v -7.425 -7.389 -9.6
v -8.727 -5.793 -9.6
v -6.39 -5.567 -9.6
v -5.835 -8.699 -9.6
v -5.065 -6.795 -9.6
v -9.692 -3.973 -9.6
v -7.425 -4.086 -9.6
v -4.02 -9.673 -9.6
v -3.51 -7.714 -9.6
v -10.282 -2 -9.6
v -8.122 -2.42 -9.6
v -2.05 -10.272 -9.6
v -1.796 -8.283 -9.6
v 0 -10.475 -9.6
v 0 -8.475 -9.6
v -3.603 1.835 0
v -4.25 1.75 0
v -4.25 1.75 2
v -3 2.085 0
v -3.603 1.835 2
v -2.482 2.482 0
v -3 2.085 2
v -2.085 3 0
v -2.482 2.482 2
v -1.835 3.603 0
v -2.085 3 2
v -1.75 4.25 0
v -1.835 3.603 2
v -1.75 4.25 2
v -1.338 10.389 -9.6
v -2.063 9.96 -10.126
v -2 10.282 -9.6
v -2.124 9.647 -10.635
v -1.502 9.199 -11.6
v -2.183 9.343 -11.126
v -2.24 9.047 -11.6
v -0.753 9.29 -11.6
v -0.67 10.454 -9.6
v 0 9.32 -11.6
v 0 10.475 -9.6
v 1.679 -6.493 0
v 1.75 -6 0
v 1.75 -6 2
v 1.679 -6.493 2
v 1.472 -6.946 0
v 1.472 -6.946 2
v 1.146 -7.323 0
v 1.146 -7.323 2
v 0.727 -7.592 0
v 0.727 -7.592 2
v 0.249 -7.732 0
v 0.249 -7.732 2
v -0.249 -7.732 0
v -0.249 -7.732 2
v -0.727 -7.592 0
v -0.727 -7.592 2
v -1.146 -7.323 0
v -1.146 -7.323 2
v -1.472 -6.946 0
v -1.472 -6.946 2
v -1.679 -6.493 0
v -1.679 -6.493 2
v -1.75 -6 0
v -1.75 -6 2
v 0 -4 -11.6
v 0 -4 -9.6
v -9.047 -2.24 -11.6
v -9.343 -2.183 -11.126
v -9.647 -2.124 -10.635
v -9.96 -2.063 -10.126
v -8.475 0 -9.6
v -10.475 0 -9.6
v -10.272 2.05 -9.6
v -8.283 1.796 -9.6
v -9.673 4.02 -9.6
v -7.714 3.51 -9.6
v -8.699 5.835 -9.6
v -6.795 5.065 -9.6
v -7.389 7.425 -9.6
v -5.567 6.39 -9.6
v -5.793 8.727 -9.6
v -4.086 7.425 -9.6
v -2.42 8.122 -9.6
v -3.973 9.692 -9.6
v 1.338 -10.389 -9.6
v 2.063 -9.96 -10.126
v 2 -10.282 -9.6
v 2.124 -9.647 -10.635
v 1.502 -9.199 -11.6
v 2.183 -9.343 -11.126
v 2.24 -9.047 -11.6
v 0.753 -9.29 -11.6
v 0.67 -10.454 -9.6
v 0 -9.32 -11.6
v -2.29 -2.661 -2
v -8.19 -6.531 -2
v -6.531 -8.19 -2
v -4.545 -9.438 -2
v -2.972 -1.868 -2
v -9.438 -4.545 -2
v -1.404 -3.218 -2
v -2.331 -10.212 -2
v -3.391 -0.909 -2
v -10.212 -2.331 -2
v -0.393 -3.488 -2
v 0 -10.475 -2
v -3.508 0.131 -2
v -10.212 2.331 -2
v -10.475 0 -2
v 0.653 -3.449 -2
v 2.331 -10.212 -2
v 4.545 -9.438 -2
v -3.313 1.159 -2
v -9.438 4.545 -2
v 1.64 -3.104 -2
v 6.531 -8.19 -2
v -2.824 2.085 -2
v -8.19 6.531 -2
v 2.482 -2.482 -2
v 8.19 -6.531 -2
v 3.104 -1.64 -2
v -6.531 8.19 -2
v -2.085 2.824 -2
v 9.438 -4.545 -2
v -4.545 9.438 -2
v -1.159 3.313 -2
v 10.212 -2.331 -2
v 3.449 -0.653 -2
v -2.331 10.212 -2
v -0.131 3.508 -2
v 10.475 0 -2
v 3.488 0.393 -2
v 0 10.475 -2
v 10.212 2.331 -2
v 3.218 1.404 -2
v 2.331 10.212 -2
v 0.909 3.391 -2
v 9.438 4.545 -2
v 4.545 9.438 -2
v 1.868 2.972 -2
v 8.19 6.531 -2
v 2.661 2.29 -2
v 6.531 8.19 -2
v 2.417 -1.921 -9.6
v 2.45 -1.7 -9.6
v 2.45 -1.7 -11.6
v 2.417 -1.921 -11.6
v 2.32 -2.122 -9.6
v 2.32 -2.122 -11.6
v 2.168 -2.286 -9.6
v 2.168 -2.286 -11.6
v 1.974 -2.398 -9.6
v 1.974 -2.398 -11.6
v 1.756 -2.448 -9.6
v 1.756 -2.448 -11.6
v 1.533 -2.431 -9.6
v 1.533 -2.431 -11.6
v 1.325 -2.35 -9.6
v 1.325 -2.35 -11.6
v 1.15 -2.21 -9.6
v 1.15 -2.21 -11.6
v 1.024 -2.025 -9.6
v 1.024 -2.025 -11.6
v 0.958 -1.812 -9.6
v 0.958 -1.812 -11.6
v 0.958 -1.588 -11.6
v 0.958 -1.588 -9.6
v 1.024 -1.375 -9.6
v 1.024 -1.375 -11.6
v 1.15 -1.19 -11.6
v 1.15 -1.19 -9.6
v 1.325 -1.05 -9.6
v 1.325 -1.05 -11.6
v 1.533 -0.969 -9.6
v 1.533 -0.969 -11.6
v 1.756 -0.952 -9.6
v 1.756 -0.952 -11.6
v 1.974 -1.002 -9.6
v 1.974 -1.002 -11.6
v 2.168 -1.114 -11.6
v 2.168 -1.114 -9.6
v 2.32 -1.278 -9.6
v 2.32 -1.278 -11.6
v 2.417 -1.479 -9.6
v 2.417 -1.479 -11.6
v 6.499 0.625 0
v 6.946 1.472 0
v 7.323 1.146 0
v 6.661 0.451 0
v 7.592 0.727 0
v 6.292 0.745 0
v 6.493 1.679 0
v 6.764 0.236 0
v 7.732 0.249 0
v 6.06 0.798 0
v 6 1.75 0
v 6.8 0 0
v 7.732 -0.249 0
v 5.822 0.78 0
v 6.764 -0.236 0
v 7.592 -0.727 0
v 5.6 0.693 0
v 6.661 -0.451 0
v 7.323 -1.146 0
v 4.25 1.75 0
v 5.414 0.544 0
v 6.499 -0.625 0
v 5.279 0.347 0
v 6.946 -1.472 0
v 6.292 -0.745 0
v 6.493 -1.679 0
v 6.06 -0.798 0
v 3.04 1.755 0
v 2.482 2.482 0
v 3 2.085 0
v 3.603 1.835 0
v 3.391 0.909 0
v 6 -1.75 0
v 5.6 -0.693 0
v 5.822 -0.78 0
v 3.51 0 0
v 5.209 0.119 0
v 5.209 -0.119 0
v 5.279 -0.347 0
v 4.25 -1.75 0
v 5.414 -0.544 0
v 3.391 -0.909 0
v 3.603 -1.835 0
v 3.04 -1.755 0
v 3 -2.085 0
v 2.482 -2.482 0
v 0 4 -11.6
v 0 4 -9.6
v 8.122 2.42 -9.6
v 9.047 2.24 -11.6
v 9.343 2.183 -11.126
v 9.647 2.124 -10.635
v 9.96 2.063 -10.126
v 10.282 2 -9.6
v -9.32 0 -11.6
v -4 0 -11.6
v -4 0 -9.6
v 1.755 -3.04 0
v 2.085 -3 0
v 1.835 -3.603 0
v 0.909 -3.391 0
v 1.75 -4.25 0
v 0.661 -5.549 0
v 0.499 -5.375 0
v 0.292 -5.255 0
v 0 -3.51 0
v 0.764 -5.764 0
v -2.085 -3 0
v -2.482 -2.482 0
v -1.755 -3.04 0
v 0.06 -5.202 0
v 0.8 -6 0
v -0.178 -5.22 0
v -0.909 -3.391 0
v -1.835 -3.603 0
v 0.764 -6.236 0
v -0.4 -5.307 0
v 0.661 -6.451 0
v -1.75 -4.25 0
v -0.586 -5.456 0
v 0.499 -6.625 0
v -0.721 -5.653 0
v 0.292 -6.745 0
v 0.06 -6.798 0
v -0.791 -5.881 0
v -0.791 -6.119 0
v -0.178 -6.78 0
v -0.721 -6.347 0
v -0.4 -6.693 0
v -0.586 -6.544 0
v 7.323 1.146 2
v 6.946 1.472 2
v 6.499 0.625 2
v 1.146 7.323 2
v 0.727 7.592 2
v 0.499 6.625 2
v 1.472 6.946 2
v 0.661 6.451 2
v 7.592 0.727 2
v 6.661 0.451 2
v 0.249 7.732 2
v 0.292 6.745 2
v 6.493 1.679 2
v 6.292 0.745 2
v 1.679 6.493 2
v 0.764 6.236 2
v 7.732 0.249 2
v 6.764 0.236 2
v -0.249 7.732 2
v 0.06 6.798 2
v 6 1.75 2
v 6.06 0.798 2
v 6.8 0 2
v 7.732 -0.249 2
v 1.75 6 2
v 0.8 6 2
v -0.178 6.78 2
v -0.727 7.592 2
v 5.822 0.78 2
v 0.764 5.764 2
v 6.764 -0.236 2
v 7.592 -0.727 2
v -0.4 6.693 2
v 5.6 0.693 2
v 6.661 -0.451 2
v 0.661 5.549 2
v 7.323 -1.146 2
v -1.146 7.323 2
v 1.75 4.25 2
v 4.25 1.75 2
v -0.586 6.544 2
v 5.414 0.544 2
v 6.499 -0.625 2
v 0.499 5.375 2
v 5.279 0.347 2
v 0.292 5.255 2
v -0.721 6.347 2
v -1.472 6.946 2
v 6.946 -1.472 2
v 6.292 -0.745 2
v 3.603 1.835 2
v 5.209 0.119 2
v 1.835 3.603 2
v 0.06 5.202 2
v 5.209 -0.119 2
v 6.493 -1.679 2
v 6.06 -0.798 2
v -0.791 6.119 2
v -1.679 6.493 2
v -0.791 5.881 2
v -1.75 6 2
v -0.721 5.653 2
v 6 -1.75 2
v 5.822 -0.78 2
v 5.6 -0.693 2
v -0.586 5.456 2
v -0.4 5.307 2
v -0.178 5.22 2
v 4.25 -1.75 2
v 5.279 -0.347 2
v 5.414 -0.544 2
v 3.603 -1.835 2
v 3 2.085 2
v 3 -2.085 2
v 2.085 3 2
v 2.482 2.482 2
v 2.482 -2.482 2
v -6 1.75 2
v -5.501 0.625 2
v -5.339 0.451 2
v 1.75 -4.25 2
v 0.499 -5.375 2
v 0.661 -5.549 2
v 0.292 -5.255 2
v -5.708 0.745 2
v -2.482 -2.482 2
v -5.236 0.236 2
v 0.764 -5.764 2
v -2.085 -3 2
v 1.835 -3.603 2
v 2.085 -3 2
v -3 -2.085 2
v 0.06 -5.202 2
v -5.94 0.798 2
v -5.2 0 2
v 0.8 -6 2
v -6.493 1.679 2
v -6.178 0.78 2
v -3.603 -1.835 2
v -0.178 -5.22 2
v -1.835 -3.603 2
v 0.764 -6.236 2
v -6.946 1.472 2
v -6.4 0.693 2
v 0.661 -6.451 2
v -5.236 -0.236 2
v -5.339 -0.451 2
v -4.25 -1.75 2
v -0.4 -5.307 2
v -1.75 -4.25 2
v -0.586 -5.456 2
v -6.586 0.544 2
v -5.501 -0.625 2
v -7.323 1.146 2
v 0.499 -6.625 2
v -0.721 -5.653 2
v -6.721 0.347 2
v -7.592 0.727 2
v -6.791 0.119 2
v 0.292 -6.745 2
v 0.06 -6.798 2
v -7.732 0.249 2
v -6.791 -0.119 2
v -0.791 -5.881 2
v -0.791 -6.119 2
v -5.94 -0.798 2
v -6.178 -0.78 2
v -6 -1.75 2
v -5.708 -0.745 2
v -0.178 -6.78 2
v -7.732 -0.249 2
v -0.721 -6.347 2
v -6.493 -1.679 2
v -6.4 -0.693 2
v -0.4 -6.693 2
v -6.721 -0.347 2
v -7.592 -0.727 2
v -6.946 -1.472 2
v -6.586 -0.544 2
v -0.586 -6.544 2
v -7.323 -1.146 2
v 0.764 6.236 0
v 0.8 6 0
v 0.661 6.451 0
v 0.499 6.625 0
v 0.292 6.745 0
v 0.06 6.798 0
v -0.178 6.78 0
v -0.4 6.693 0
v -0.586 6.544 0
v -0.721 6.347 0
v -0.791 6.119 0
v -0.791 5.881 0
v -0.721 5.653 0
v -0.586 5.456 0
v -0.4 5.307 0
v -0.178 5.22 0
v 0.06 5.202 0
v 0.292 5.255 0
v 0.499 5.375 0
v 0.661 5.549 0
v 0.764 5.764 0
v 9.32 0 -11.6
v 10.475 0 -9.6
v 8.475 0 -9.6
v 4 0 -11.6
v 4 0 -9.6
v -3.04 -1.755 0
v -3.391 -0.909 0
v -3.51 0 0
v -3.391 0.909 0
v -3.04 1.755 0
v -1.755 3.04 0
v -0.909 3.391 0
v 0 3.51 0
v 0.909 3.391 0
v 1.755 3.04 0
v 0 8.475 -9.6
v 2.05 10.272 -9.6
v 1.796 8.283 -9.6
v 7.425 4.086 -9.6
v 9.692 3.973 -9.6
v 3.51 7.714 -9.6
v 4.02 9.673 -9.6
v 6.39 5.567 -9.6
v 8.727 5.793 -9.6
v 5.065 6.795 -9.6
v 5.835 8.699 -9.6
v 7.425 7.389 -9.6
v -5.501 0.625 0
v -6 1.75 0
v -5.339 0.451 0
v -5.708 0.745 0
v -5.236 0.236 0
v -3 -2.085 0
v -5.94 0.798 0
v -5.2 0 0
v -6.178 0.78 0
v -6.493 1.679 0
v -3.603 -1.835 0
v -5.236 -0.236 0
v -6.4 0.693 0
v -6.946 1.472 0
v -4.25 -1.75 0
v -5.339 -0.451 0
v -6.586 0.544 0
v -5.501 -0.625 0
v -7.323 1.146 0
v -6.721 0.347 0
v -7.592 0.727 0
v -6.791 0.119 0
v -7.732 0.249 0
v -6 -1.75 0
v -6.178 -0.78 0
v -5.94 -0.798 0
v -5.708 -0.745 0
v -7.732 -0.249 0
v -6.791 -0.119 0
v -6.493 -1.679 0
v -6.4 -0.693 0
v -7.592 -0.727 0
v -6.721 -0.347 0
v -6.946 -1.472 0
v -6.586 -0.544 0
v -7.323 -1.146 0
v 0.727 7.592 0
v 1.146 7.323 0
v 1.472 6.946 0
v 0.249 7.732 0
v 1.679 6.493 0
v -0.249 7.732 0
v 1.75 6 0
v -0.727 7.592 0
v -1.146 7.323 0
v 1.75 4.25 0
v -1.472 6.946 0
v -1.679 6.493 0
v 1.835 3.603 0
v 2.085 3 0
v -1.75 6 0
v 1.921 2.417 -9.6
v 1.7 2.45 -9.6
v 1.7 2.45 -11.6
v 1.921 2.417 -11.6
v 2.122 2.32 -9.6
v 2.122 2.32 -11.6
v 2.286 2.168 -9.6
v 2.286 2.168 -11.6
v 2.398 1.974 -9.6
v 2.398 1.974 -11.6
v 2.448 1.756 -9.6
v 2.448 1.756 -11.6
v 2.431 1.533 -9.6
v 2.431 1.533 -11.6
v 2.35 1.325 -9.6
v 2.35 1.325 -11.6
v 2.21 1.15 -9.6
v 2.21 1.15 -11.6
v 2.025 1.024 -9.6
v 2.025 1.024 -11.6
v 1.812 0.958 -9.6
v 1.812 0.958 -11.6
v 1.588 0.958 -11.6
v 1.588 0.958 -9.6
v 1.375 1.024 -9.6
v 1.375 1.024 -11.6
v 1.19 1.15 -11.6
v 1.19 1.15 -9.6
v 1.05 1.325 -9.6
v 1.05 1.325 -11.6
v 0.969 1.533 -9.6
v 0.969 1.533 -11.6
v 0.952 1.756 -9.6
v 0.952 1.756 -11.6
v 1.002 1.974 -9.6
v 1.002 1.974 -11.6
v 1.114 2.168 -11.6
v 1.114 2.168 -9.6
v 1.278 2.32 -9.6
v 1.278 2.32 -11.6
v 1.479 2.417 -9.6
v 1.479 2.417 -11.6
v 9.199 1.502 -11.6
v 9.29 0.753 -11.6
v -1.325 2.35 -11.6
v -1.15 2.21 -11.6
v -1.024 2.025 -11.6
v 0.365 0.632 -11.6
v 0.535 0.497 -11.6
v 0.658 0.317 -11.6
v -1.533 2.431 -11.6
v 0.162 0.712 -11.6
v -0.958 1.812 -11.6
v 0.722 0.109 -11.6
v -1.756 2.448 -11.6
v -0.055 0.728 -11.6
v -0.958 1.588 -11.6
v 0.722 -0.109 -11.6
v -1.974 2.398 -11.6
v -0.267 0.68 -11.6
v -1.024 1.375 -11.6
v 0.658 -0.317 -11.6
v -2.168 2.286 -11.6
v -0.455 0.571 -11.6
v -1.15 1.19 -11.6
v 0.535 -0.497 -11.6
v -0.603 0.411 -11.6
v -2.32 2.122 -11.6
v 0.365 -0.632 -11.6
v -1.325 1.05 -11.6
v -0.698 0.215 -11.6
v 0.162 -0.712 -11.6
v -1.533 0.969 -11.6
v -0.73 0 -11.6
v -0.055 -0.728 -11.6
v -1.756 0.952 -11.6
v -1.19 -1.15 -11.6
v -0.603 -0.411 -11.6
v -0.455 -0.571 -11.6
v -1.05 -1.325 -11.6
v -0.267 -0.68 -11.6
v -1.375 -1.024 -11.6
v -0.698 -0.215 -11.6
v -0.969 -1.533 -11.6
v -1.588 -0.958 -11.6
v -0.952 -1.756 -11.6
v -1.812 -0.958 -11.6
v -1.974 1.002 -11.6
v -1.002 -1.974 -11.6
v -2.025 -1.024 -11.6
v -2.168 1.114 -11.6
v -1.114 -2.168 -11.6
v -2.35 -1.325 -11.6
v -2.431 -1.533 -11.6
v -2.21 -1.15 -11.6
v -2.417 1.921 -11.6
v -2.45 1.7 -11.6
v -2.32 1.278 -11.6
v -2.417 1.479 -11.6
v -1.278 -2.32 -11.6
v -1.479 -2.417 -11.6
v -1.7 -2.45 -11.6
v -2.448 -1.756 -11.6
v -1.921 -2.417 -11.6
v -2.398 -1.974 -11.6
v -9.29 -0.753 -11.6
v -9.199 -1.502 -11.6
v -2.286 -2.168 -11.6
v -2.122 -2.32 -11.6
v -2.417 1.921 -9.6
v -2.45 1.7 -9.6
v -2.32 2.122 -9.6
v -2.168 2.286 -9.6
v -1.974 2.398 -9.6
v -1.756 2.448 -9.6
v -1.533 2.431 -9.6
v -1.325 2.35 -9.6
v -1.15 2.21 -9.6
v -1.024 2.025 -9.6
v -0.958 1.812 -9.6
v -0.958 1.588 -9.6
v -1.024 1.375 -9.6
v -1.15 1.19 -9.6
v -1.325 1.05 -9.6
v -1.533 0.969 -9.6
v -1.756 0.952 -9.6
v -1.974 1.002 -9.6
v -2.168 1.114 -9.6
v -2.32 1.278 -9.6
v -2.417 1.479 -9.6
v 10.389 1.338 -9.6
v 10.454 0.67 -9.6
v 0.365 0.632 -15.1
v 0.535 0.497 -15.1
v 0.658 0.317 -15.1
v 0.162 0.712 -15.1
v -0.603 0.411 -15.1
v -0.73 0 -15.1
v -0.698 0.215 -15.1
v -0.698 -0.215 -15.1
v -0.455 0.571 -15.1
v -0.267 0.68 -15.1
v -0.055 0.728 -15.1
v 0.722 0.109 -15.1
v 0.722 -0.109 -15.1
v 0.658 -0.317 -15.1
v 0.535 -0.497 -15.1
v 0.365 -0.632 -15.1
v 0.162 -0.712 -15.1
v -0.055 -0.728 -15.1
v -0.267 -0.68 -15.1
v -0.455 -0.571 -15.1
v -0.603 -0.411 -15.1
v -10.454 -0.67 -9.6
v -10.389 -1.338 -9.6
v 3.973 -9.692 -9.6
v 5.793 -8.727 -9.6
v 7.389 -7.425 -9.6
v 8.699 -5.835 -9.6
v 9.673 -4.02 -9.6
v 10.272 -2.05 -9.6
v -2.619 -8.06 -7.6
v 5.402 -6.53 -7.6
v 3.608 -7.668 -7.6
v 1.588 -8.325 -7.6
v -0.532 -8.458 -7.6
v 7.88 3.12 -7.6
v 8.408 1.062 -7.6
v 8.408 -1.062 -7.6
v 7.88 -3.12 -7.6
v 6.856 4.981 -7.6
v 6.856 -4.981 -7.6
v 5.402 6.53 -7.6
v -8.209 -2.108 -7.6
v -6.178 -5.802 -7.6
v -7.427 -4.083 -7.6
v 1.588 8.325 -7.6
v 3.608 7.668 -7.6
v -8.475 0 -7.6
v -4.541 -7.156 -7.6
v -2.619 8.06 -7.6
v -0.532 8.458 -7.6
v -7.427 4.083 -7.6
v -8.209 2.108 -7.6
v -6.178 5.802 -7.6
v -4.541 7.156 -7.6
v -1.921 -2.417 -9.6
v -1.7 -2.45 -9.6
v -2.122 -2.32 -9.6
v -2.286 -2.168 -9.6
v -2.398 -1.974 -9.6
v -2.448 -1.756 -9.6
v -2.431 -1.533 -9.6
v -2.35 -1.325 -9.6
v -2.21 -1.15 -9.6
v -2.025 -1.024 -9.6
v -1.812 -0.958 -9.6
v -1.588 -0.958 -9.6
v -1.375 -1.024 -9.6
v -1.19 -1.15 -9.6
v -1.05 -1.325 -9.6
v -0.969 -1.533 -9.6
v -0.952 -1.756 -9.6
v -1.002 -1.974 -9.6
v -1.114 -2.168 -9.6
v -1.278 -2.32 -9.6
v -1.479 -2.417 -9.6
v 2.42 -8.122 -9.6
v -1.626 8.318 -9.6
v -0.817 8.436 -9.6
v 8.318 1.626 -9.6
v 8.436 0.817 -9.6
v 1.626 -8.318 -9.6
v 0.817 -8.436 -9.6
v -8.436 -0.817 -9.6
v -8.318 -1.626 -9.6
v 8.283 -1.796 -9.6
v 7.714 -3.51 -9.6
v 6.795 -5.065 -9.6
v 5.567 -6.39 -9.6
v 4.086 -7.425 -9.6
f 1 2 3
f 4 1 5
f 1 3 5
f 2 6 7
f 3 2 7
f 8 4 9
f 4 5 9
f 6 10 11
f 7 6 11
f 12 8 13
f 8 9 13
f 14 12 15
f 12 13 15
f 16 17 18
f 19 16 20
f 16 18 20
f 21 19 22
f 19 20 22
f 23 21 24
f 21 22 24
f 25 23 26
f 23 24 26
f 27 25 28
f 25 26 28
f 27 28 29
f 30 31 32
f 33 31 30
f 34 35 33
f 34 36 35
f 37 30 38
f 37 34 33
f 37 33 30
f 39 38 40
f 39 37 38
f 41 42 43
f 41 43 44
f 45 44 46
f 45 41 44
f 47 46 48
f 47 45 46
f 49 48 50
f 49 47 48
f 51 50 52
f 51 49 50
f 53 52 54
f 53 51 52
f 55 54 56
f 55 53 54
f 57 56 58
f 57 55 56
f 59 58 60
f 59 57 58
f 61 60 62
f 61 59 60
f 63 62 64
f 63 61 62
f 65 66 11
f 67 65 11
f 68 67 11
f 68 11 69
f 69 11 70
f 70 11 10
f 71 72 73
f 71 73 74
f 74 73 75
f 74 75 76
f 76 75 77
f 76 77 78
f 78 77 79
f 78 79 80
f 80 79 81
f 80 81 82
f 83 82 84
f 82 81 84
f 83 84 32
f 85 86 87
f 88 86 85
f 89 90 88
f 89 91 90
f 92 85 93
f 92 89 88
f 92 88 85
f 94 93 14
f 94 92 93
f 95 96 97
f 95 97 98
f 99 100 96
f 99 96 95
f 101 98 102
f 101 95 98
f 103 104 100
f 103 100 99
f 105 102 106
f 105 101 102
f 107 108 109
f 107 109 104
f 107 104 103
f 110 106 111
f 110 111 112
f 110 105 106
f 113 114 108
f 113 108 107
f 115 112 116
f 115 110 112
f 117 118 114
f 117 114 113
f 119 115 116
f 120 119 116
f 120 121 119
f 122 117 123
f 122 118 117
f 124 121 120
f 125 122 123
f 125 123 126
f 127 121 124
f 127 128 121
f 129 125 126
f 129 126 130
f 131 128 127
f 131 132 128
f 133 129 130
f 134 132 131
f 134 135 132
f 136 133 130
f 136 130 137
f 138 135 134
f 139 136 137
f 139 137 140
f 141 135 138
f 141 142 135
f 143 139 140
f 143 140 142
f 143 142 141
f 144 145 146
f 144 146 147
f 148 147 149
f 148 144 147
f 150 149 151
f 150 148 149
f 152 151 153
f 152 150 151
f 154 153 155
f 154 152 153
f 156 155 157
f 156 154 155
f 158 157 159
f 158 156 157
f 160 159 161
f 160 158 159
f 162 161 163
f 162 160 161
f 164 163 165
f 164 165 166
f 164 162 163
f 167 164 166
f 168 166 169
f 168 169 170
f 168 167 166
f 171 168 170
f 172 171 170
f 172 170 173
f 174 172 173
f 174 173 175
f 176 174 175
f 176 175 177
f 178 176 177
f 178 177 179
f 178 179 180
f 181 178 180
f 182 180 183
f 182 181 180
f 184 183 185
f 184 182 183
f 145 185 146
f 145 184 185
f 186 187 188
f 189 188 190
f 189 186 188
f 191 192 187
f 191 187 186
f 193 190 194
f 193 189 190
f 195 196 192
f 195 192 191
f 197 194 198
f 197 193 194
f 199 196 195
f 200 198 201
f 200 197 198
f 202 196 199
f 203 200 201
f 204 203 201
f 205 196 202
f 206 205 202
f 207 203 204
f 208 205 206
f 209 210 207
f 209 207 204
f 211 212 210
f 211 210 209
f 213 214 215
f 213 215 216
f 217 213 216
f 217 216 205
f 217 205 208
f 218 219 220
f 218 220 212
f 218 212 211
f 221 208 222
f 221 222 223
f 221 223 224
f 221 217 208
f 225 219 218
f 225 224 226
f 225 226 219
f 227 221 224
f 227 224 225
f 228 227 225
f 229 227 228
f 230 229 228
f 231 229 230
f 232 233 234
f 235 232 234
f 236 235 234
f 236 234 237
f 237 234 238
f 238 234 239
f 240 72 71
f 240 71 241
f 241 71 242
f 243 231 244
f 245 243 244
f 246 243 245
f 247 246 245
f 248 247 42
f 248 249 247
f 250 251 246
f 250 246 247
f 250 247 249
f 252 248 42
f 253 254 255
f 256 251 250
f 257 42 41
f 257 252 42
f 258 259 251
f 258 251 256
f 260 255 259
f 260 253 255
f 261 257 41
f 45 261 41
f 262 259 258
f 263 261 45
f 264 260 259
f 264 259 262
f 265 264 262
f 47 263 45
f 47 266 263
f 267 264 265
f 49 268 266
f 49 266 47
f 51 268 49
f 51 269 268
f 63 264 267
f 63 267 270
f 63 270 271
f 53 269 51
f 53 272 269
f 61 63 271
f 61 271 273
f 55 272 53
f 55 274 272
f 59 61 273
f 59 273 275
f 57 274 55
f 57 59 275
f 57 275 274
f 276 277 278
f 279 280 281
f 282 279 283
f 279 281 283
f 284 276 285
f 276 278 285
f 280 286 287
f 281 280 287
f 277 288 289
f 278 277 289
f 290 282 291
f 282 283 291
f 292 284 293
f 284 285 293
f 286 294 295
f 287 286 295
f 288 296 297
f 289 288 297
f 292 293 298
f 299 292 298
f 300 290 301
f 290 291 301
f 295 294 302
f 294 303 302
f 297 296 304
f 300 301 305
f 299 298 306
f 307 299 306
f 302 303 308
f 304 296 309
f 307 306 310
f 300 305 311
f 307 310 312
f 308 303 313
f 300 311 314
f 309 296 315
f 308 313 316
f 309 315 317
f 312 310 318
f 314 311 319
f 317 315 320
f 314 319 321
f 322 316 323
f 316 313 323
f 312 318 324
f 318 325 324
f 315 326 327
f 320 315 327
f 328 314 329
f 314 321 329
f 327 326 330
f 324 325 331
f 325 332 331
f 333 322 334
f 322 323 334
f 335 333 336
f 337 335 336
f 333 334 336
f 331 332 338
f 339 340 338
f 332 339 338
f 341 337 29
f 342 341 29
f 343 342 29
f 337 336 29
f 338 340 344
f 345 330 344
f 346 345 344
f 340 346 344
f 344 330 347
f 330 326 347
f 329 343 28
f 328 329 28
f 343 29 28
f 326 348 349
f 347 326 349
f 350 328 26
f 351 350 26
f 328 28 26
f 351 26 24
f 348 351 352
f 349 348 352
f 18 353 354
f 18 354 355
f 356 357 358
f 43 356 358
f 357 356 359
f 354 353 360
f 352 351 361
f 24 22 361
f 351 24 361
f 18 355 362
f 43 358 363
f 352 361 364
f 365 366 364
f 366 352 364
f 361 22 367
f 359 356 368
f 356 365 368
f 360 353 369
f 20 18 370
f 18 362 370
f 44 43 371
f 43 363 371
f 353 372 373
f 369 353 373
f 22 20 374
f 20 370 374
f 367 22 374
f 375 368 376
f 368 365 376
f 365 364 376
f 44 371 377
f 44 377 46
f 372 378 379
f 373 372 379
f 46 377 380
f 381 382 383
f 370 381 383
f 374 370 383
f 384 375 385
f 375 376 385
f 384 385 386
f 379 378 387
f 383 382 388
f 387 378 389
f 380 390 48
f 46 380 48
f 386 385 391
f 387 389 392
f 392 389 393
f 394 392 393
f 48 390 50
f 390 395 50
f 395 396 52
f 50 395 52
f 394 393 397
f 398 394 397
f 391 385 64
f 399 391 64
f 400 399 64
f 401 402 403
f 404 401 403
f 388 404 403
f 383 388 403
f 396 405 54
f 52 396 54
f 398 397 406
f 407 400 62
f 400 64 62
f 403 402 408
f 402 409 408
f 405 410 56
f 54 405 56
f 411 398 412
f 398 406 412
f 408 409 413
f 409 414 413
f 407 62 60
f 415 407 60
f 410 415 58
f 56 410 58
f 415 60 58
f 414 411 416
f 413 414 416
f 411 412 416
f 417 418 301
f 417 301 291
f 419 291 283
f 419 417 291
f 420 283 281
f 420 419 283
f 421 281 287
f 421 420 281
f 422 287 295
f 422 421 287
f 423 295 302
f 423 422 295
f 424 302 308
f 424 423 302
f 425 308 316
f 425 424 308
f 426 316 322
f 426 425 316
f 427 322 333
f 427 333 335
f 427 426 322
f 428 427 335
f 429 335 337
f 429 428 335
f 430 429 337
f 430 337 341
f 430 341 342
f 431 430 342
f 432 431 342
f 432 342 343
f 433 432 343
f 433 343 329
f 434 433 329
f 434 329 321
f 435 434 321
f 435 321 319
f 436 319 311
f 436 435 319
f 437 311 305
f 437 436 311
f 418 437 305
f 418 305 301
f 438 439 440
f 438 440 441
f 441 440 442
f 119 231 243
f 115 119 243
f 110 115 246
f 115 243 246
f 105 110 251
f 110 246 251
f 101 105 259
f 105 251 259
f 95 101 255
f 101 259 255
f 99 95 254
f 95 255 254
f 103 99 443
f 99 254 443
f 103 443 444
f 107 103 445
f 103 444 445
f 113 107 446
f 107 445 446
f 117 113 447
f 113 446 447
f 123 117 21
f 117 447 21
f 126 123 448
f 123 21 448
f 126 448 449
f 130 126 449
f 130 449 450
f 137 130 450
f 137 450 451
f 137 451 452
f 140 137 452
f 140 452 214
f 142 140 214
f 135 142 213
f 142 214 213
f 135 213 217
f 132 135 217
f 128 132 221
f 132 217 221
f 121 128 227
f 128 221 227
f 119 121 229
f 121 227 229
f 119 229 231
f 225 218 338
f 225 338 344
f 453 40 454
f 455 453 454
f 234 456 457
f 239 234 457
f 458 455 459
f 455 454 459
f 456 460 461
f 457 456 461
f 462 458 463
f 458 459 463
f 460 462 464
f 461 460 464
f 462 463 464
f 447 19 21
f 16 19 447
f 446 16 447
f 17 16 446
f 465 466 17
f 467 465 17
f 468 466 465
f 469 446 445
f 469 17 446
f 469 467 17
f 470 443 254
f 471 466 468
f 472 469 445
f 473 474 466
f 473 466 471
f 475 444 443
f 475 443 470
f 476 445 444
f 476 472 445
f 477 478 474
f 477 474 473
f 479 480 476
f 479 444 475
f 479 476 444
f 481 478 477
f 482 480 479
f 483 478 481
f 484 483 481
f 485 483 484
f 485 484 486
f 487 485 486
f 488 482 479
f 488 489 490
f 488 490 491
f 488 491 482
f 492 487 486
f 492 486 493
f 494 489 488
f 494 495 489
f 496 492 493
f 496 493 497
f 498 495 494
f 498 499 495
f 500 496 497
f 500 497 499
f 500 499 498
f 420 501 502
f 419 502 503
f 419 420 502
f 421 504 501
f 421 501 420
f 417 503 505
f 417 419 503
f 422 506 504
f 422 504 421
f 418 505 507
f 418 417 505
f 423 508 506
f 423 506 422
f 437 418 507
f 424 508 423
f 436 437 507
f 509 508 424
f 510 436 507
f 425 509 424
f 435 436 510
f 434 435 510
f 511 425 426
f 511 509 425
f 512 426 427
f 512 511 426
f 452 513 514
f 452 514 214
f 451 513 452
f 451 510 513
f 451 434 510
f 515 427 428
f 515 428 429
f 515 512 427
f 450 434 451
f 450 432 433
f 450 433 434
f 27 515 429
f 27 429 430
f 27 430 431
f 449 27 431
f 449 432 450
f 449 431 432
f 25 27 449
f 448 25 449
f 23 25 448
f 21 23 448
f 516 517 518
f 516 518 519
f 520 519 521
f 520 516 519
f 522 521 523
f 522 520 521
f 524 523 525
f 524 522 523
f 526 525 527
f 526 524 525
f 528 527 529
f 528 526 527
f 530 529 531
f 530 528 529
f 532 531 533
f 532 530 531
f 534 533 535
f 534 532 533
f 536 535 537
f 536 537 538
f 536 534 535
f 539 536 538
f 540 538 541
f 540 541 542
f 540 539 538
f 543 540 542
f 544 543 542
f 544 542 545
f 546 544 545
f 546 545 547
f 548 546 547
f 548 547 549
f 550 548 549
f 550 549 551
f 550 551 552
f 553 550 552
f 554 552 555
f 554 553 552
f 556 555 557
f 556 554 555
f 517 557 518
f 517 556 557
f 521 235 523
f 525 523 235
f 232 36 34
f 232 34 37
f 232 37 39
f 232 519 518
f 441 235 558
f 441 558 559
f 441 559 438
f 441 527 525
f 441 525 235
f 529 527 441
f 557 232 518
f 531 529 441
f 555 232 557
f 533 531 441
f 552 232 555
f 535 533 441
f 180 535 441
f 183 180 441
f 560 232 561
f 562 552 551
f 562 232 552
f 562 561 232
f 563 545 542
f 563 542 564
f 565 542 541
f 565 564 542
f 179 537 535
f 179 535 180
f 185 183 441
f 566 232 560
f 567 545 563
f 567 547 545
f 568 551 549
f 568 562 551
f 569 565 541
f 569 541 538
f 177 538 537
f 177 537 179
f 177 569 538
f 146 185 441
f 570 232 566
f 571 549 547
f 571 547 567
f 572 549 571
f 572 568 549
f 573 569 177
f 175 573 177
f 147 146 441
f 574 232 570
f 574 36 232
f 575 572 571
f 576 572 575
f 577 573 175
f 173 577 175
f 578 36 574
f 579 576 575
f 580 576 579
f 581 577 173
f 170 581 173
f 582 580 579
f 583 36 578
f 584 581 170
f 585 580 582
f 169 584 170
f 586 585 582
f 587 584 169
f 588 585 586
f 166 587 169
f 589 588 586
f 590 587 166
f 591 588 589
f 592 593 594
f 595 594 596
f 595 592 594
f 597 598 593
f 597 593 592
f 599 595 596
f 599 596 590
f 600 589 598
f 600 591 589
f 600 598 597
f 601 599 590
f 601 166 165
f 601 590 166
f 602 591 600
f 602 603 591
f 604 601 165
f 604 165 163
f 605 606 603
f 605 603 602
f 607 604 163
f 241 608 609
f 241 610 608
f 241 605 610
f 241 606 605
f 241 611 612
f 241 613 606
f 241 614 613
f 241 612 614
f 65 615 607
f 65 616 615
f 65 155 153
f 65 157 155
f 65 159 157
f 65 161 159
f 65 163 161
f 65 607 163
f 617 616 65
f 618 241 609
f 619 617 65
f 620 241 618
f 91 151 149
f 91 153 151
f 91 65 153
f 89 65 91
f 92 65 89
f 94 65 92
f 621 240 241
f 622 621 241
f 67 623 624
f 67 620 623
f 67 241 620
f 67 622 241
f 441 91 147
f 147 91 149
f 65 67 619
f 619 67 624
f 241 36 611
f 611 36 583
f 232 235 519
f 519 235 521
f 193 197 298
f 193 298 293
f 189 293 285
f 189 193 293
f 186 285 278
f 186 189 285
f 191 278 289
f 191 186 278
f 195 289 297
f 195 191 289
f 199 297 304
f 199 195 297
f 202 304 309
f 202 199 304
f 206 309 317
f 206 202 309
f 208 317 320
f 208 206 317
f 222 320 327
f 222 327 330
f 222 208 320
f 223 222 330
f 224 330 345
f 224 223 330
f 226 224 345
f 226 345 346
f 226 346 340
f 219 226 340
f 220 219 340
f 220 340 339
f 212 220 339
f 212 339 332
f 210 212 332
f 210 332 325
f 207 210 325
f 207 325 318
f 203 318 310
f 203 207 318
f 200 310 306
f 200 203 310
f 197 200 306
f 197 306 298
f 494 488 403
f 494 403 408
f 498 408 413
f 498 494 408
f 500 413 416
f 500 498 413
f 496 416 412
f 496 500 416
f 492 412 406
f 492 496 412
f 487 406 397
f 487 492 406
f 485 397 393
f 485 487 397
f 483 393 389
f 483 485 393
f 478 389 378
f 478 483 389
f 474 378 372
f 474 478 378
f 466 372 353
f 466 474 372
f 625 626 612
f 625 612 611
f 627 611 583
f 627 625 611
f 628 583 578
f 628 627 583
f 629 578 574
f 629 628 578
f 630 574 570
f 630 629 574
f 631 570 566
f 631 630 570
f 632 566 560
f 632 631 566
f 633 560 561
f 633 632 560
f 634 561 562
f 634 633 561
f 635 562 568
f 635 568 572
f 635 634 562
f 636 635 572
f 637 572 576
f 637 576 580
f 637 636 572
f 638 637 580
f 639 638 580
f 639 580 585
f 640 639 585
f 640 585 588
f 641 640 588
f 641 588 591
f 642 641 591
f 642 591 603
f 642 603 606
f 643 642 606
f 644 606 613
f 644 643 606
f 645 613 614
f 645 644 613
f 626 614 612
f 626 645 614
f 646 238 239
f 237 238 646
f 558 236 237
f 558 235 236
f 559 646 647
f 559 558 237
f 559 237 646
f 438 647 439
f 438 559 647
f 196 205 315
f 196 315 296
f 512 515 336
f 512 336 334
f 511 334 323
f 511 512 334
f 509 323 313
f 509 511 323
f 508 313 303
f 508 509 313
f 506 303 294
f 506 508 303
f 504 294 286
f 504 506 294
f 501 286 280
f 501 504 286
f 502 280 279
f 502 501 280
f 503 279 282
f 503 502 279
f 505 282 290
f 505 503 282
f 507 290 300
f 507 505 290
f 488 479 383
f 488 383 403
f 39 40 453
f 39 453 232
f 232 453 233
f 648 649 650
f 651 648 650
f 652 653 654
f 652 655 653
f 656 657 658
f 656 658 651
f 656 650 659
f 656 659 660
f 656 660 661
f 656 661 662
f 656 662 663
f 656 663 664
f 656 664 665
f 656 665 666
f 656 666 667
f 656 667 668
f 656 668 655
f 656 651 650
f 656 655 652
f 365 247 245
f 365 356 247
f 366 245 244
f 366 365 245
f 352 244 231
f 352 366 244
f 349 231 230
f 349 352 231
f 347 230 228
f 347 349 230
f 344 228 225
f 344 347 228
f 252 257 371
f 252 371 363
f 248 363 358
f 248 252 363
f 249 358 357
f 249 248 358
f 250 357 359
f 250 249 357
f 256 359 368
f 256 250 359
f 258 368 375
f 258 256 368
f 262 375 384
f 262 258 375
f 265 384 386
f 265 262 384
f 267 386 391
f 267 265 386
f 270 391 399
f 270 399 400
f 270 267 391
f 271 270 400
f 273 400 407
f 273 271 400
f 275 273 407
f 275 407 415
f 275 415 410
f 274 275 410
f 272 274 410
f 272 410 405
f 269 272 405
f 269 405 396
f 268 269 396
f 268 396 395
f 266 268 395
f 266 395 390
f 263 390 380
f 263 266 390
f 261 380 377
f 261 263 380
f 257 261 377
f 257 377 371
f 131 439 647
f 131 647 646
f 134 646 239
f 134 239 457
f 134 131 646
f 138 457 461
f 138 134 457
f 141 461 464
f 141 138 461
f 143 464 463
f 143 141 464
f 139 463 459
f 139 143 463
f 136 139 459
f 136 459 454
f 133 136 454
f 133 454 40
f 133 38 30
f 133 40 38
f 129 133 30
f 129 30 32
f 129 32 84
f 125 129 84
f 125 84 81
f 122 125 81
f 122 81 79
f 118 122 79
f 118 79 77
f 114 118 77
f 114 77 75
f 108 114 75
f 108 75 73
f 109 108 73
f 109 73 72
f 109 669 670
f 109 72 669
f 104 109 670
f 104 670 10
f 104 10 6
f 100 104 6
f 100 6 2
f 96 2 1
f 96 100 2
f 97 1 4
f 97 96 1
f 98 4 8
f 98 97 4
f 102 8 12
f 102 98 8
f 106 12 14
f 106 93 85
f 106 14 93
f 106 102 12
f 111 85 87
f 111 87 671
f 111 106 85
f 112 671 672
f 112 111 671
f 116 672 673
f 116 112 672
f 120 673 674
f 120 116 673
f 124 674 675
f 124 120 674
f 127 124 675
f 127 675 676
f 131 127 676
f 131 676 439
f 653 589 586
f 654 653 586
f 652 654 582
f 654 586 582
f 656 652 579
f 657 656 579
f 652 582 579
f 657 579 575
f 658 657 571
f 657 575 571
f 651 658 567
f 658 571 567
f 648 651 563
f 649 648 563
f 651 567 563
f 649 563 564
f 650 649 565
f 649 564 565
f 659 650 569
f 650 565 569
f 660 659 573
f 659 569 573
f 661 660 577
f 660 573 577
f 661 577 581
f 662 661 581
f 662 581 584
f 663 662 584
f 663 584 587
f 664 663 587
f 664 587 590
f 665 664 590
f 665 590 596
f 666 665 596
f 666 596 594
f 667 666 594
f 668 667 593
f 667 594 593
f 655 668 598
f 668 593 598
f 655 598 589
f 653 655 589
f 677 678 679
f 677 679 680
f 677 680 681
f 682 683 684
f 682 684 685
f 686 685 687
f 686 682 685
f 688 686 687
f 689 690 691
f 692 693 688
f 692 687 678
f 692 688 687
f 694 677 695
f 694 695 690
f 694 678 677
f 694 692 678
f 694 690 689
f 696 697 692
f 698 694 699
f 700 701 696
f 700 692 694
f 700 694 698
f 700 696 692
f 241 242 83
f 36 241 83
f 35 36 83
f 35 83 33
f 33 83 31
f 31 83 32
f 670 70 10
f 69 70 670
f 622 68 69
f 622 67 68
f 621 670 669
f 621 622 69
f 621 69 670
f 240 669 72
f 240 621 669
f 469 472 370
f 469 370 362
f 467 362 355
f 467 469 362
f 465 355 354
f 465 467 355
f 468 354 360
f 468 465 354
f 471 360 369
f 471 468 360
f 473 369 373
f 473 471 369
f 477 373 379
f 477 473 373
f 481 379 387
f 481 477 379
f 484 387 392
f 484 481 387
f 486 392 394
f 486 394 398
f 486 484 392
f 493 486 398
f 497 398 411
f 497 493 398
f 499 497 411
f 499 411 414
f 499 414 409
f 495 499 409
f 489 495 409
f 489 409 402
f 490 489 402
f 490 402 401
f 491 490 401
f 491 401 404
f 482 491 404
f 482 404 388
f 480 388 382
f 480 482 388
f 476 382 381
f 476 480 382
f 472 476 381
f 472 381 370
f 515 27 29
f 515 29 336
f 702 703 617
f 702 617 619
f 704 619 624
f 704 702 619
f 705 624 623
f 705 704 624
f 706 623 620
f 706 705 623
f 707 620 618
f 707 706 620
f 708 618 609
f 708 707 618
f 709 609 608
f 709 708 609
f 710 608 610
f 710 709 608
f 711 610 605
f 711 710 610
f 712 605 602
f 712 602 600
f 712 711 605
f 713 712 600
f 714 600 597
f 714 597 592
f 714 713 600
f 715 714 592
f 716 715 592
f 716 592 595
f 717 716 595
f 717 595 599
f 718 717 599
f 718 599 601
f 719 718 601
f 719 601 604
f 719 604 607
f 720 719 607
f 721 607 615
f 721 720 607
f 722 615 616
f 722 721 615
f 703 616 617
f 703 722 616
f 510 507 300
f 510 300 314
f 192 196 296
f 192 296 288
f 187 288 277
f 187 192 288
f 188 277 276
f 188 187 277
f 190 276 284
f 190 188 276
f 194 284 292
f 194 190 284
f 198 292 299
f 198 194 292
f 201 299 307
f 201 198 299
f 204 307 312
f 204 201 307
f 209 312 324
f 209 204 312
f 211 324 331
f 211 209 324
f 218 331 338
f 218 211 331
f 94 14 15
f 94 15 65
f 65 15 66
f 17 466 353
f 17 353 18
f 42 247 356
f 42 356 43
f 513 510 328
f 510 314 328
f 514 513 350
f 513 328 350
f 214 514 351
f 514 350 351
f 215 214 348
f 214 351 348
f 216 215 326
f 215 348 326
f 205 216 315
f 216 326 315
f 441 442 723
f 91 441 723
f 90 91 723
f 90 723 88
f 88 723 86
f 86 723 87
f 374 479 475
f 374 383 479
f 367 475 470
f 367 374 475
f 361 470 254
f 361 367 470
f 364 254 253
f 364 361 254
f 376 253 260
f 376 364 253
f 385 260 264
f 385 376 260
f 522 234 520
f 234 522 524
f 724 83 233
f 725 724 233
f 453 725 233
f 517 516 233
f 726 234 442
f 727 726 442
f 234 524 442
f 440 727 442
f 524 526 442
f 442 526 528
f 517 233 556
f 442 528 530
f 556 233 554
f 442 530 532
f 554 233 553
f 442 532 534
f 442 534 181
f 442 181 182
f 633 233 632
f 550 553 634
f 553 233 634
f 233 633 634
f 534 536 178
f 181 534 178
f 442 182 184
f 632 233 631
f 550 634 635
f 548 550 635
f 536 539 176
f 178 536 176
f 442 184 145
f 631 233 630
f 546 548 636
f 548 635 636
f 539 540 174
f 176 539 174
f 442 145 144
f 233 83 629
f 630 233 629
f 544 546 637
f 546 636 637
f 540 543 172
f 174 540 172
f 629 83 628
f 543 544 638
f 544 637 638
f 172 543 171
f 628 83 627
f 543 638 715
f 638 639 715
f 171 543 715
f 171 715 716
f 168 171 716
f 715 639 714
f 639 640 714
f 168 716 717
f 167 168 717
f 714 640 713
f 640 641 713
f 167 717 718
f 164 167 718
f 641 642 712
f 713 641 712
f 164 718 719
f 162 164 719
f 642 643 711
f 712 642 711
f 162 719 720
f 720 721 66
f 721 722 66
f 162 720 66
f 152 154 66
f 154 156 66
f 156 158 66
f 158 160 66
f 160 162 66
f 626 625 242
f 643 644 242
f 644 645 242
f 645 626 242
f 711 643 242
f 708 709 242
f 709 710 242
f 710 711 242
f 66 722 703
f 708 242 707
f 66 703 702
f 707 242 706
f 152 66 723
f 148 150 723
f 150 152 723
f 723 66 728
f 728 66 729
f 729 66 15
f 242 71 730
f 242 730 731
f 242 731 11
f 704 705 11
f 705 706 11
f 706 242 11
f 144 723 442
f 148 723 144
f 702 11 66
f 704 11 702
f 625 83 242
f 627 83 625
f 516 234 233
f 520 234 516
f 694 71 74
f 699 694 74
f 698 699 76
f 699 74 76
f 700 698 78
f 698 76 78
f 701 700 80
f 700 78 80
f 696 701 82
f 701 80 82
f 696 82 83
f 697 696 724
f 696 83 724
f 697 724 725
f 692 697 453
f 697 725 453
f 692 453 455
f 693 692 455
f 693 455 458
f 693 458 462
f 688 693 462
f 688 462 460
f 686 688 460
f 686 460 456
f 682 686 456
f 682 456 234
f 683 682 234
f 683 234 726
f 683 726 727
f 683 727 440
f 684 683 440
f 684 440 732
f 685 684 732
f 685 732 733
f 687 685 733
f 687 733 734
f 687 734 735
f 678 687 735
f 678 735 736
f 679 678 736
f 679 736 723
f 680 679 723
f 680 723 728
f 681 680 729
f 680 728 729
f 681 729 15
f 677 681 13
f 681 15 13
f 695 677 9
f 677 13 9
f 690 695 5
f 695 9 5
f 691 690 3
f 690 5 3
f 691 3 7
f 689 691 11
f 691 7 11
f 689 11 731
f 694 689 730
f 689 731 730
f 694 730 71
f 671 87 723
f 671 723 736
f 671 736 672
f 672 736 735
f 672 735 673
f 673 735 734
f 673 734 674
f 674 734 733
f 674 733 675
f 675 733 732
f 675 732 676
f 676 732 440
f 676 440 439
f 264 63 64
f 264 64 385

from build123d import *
from OCP.BRepFilletAPI import BRepFilletAPI_MakeChamfer
from build123d.topology import SkipClean

# Parameters (mm, degrees)
SKETCH1_R                      = 0.8
BOSS_EXTRUDE1_DEPTH            = 2
FILLET2_R                      = 2.5
SKETCH2_R                      = 3.51040764
BOSS_EXTRUDE2_DEPTH            = 2
BOSS_EXTRUDE3_START            = -2
SKETCH3_R                      = 10.475
BOSS_EXTRUDE3_DEPTH            = 7.6
SKETCH4_R                      = 8.475
CUT_EXTRUDE1_DEPTH             = 2
SKETCH5_R                      = 0.75
BOSS_EXTRUDE4_DEPTH            = 2
CHAMFER1_SIZE2                 = 1.154700538
CHAMFER1_SIZE                  = 2
CIRPATTERN2_COUNT              = 4
CHAMFER1_OF_CIRPATTERN2_SIZE   = 2
CHAMFER1_OF_CIRPATTERN2_SIZE_2 = 1.154700538
SKETCH6_R                      = 0.73
BOSS_EXTRUDE5_DEPTH            = 3.5


with BuildPart() as part:
    # Sketch1 → Boss-Extrude1 (new body)
    with BuildSketch(Plane(origin=(0, 0, 0), x_dir=(0, 1, 0), z_dir=(0, 0, 1))):
        with BuildLine():
            Line((-1.75, 1.75), (-1.75, 6))
            ThreePointArc((-1.75, 6), (0, 7.75), (1.75, 6))
            Line((1.75, 6), (1.75, 1.75))
            Line((1.75, 1.75), (6, 1.75))
            ThreePointArc((6, 1.75), (7.75, 0), (6, -1.75))
            Line((6, -1.75), (1.75, -1.75))
            Line((1.75, -1.75), (1.75, -6))
            ThreePointArc((1.75, -6), (0, -7.75), (-1.75, -6))
            Line((-1.75, -6), (-1.75, -1.75))
            Line((-1.75, -1.75), (-6, -1.75))
            ThreePointArc((-6, -1.75), (-7.75, 0), (-6, 1.75))
            Line((-6, 1.75), (-1.75, 1.75))
        make_face()
        with Locations(Location((0, 6, 0), (0, 0, 270))):
            Circle(SKETCH1_R, mode=Mode.SUBTRACT)
        with Locations(Location((6, 0, 0), (0, 0, 270))):
            Circle(SKETCH1_R, mode=Mode.SUBTRACT)
        with Locations(Location((0, -6, 0), (0, 0, 270))):
            Circle(SKETCH1_R, mode=Mode.SUBTRACT)
        with Locations(Location((-6, 0, 0), (0, 0, 270))):
            Circle(SKETCH1_R, mode=Mode.SUBTRACT)
    extrude(amount=BOSS_EXTRUDE1_DEPTH)

    # Fillet2
    fillet2_edges = [part.edges().sort_by_distance(p)[0] for p in [
        (1.75, 1.75, 1),
        (1.75, -1.75, 1),
        (-1.75, -1.75, 1),
        (-1.75, 1.75, 1),
    ]]
    fillet(fillet2_edges, radius=FILLET2_R)

    # Sketch2 → Boss-Extrude2 (add)
    with BuildSketch(Plane(origin=(0, 0, 0), x_dir=(1, 0, 0), z_dir=(0, 0, -1))):
        with Locations(Location((0, 0, 0), (0, 0, 45))):
            Circle(SKETCH2_R)
    extrude(amount=BOSS_EXTRUDE2_DEPTH)

    # Sketch3 → Boss-Extrude3 (add)
    with BuildSketch(Plane(origin=(0, 0, 0), x_dir=(0, 1, 0), z_dir=(0, 0, 1)).offset(BOSS_EXTRUDE3_START)):
        with Locations(Location((0, 0, 0), (0, 0, 270))):
            Circle(SKETCH3_R)
    extrude(amount=-BOSS_EXTRUDE3_DEPTH)

    # Sketch4 → Cut-Extrude1 (cut)
    with BuildSketch(Plane(origin=(0, 0, -9.6), x_dir=(1, 0, 0), z_dir=(0, 0, -1))):
        with Locations(Location((0, 0, 0), (0, 0, 180))):
            Circle(SKETCH4_R)
    extrude(amount=-CUT_EXTRUDE1_DEPTH, mode=Mode.SUBTRACT)

    # Sketch5 → Boss-Extrude4 (add)
    with BuildSketch(Plane(origin=(0, 0, -9.6), x_dir=(1, 0, 0), z_dir=(0, 0, -1))):
        with BuildLine():
            Line((0, 0), (-4, 0))
            Line((-4, 0), (-2, -10.282296679))
            ThreePointArc((-2, -10.282296679), (-1.004631098, -10.426712874), (0, -10.475))
            Line((0, -10.475), (0, 0))
        make_face()
        with Locations(Location((-1.7, -1.7, 0), (0, 0, 180))):
            Circle(SKETCH5_R, mode=Mode.SUBTRACT)
    boss_extrude4 = extrude(amount=BOSS_EXTRUDE4_DEPTH)

    # Chamfer1
    chamfer1_edges = [part.edges().sort_by_distance(p)[0] for p in [
        (-1.004631098, 10.426712874, -11.6),
    ]]
    chamfer1_side = [part.faces().sort_by_distance(p)[0] for p in [
        (-1.004631098, 10.426712874, -11.576905989),
    ]]
    chamfer(chamfer1_edges, length=CHAMFER1_SIZE - 0.0001, length2=CHAMFER1_SIZE2 - 0.0001, reference=chamfer1_side[0])  # a hair under: the kernel refuses the full size

    # CirPattern2: Boss-Extrude4 ×4 about axis
    with SkipClean():  # the faces are left unmerged after this step: merging them gives an invalid solid
        cirpattern2_axis = Axis((0, 0, 0), (0, 0, 1))
        for i in range(1, CIRPATTERN2_COUNT):
            add(boss_extrude4.rotate(cirpattern2_axis, i * 360 / CIRPATTERN2_COUNT))

    # Chamfer1 of CirPattern2
    chamfer1_of_cirpattern2_edges_1 = [part.edges().sort_by_distance(p)[0] for p in [
        (-10.426712874, -1.004631098, -11.6),
    ]]
    chamfer1_of_cirpattern2_side_1 = [part.faces().sort_by_distance(p)[0] for p in [
        (-10.426712874, -1.004631098, -11.576905989),
    ]]
    chamfer1_of_cirpattern2_edges_2 = [part.edges().sort_by_distance(p)[0] for p in [
        (1.004631098, -10.426712874, -11.6),
    ]]
    chamfer1_of_cirpattern2_side_2 = [part.faces().sort_by_distance(p)[0] for p in [
        (1.004631098, -10.426712874, -11.576905989),
    ]]
    chamfer1_of_cirpattern2_edges_3 = [part.edges().sort_by_distance(p)[0] for p in [
        (10.426712874, 1.004631098, -11.6),
    ]]
    chamfer1_of_cirpattern2_side_3 = [part.faces().sort_by_distance(p)[0] for p in [
        (10.426712874, 1.004631098, -11.576905989),
    ]]
    chamfer1_of_cirpattern2 = BRepFilletAPI_MakeChamfer(part.part.solid().wrapped)
    for e in chamfer1_of_cirpattern2_edges_1:
        chamfer1_of_cirpattern2.Add(CHAMFER1_OF_CIRPATTERN2_SIZE - 0.0001, CHAMFER1_OF_CIRPATTERN2_SIZE_2 - 0.0001, e.wrapped, chamfer1_of_cirpattern2_side_1[0].wrapped)
    for e in chamfer1_of_cirpattern2_edges_2:
        chamfer1_of_cirpattern2.Add(CHAMFER1_OF_CIRPATTERN2_SIZE - 0.0001, CHAMFER1_OF_CIRPATTERN2_SIZE_2 - 0.0001, e.wrapped, chamfer1_of_cirpattern2_side_2[0].wrapped)
    for e in chamfer1_of_cirpattern2_edges_3:
        chamfer1_of_cirpattern2.Add(CHAMFER1_OF_CIRPATTERN2_SIZE - 0.0001, CHAMFER1_OF_CIRPATTERN2_SIZE_2 - 0.0001, e.wrapped, chamfer1_of_cirpattern2_side_3[0].wrapped)
    add(Compound.cast(chamfer1_of_cirpattern2.Shape()), mode=Mode.REPLACE)  # a hair under: the kernel refuses the full size

    # Sketch6 → Boss-Extrude5 (add)
    with BuildSketch(Plane(origin=(0, 0, -11.6), x_dir=(1, 0, 0), z_dir=(0, 0, -1))):
        with Locations(Location((0, 0, 0), (0, 0, 180))):
            Circle(SKETCH6_R)
    extrude(amount=BOSS_EXTRUDE5_DEPTH)


solid = part.part
